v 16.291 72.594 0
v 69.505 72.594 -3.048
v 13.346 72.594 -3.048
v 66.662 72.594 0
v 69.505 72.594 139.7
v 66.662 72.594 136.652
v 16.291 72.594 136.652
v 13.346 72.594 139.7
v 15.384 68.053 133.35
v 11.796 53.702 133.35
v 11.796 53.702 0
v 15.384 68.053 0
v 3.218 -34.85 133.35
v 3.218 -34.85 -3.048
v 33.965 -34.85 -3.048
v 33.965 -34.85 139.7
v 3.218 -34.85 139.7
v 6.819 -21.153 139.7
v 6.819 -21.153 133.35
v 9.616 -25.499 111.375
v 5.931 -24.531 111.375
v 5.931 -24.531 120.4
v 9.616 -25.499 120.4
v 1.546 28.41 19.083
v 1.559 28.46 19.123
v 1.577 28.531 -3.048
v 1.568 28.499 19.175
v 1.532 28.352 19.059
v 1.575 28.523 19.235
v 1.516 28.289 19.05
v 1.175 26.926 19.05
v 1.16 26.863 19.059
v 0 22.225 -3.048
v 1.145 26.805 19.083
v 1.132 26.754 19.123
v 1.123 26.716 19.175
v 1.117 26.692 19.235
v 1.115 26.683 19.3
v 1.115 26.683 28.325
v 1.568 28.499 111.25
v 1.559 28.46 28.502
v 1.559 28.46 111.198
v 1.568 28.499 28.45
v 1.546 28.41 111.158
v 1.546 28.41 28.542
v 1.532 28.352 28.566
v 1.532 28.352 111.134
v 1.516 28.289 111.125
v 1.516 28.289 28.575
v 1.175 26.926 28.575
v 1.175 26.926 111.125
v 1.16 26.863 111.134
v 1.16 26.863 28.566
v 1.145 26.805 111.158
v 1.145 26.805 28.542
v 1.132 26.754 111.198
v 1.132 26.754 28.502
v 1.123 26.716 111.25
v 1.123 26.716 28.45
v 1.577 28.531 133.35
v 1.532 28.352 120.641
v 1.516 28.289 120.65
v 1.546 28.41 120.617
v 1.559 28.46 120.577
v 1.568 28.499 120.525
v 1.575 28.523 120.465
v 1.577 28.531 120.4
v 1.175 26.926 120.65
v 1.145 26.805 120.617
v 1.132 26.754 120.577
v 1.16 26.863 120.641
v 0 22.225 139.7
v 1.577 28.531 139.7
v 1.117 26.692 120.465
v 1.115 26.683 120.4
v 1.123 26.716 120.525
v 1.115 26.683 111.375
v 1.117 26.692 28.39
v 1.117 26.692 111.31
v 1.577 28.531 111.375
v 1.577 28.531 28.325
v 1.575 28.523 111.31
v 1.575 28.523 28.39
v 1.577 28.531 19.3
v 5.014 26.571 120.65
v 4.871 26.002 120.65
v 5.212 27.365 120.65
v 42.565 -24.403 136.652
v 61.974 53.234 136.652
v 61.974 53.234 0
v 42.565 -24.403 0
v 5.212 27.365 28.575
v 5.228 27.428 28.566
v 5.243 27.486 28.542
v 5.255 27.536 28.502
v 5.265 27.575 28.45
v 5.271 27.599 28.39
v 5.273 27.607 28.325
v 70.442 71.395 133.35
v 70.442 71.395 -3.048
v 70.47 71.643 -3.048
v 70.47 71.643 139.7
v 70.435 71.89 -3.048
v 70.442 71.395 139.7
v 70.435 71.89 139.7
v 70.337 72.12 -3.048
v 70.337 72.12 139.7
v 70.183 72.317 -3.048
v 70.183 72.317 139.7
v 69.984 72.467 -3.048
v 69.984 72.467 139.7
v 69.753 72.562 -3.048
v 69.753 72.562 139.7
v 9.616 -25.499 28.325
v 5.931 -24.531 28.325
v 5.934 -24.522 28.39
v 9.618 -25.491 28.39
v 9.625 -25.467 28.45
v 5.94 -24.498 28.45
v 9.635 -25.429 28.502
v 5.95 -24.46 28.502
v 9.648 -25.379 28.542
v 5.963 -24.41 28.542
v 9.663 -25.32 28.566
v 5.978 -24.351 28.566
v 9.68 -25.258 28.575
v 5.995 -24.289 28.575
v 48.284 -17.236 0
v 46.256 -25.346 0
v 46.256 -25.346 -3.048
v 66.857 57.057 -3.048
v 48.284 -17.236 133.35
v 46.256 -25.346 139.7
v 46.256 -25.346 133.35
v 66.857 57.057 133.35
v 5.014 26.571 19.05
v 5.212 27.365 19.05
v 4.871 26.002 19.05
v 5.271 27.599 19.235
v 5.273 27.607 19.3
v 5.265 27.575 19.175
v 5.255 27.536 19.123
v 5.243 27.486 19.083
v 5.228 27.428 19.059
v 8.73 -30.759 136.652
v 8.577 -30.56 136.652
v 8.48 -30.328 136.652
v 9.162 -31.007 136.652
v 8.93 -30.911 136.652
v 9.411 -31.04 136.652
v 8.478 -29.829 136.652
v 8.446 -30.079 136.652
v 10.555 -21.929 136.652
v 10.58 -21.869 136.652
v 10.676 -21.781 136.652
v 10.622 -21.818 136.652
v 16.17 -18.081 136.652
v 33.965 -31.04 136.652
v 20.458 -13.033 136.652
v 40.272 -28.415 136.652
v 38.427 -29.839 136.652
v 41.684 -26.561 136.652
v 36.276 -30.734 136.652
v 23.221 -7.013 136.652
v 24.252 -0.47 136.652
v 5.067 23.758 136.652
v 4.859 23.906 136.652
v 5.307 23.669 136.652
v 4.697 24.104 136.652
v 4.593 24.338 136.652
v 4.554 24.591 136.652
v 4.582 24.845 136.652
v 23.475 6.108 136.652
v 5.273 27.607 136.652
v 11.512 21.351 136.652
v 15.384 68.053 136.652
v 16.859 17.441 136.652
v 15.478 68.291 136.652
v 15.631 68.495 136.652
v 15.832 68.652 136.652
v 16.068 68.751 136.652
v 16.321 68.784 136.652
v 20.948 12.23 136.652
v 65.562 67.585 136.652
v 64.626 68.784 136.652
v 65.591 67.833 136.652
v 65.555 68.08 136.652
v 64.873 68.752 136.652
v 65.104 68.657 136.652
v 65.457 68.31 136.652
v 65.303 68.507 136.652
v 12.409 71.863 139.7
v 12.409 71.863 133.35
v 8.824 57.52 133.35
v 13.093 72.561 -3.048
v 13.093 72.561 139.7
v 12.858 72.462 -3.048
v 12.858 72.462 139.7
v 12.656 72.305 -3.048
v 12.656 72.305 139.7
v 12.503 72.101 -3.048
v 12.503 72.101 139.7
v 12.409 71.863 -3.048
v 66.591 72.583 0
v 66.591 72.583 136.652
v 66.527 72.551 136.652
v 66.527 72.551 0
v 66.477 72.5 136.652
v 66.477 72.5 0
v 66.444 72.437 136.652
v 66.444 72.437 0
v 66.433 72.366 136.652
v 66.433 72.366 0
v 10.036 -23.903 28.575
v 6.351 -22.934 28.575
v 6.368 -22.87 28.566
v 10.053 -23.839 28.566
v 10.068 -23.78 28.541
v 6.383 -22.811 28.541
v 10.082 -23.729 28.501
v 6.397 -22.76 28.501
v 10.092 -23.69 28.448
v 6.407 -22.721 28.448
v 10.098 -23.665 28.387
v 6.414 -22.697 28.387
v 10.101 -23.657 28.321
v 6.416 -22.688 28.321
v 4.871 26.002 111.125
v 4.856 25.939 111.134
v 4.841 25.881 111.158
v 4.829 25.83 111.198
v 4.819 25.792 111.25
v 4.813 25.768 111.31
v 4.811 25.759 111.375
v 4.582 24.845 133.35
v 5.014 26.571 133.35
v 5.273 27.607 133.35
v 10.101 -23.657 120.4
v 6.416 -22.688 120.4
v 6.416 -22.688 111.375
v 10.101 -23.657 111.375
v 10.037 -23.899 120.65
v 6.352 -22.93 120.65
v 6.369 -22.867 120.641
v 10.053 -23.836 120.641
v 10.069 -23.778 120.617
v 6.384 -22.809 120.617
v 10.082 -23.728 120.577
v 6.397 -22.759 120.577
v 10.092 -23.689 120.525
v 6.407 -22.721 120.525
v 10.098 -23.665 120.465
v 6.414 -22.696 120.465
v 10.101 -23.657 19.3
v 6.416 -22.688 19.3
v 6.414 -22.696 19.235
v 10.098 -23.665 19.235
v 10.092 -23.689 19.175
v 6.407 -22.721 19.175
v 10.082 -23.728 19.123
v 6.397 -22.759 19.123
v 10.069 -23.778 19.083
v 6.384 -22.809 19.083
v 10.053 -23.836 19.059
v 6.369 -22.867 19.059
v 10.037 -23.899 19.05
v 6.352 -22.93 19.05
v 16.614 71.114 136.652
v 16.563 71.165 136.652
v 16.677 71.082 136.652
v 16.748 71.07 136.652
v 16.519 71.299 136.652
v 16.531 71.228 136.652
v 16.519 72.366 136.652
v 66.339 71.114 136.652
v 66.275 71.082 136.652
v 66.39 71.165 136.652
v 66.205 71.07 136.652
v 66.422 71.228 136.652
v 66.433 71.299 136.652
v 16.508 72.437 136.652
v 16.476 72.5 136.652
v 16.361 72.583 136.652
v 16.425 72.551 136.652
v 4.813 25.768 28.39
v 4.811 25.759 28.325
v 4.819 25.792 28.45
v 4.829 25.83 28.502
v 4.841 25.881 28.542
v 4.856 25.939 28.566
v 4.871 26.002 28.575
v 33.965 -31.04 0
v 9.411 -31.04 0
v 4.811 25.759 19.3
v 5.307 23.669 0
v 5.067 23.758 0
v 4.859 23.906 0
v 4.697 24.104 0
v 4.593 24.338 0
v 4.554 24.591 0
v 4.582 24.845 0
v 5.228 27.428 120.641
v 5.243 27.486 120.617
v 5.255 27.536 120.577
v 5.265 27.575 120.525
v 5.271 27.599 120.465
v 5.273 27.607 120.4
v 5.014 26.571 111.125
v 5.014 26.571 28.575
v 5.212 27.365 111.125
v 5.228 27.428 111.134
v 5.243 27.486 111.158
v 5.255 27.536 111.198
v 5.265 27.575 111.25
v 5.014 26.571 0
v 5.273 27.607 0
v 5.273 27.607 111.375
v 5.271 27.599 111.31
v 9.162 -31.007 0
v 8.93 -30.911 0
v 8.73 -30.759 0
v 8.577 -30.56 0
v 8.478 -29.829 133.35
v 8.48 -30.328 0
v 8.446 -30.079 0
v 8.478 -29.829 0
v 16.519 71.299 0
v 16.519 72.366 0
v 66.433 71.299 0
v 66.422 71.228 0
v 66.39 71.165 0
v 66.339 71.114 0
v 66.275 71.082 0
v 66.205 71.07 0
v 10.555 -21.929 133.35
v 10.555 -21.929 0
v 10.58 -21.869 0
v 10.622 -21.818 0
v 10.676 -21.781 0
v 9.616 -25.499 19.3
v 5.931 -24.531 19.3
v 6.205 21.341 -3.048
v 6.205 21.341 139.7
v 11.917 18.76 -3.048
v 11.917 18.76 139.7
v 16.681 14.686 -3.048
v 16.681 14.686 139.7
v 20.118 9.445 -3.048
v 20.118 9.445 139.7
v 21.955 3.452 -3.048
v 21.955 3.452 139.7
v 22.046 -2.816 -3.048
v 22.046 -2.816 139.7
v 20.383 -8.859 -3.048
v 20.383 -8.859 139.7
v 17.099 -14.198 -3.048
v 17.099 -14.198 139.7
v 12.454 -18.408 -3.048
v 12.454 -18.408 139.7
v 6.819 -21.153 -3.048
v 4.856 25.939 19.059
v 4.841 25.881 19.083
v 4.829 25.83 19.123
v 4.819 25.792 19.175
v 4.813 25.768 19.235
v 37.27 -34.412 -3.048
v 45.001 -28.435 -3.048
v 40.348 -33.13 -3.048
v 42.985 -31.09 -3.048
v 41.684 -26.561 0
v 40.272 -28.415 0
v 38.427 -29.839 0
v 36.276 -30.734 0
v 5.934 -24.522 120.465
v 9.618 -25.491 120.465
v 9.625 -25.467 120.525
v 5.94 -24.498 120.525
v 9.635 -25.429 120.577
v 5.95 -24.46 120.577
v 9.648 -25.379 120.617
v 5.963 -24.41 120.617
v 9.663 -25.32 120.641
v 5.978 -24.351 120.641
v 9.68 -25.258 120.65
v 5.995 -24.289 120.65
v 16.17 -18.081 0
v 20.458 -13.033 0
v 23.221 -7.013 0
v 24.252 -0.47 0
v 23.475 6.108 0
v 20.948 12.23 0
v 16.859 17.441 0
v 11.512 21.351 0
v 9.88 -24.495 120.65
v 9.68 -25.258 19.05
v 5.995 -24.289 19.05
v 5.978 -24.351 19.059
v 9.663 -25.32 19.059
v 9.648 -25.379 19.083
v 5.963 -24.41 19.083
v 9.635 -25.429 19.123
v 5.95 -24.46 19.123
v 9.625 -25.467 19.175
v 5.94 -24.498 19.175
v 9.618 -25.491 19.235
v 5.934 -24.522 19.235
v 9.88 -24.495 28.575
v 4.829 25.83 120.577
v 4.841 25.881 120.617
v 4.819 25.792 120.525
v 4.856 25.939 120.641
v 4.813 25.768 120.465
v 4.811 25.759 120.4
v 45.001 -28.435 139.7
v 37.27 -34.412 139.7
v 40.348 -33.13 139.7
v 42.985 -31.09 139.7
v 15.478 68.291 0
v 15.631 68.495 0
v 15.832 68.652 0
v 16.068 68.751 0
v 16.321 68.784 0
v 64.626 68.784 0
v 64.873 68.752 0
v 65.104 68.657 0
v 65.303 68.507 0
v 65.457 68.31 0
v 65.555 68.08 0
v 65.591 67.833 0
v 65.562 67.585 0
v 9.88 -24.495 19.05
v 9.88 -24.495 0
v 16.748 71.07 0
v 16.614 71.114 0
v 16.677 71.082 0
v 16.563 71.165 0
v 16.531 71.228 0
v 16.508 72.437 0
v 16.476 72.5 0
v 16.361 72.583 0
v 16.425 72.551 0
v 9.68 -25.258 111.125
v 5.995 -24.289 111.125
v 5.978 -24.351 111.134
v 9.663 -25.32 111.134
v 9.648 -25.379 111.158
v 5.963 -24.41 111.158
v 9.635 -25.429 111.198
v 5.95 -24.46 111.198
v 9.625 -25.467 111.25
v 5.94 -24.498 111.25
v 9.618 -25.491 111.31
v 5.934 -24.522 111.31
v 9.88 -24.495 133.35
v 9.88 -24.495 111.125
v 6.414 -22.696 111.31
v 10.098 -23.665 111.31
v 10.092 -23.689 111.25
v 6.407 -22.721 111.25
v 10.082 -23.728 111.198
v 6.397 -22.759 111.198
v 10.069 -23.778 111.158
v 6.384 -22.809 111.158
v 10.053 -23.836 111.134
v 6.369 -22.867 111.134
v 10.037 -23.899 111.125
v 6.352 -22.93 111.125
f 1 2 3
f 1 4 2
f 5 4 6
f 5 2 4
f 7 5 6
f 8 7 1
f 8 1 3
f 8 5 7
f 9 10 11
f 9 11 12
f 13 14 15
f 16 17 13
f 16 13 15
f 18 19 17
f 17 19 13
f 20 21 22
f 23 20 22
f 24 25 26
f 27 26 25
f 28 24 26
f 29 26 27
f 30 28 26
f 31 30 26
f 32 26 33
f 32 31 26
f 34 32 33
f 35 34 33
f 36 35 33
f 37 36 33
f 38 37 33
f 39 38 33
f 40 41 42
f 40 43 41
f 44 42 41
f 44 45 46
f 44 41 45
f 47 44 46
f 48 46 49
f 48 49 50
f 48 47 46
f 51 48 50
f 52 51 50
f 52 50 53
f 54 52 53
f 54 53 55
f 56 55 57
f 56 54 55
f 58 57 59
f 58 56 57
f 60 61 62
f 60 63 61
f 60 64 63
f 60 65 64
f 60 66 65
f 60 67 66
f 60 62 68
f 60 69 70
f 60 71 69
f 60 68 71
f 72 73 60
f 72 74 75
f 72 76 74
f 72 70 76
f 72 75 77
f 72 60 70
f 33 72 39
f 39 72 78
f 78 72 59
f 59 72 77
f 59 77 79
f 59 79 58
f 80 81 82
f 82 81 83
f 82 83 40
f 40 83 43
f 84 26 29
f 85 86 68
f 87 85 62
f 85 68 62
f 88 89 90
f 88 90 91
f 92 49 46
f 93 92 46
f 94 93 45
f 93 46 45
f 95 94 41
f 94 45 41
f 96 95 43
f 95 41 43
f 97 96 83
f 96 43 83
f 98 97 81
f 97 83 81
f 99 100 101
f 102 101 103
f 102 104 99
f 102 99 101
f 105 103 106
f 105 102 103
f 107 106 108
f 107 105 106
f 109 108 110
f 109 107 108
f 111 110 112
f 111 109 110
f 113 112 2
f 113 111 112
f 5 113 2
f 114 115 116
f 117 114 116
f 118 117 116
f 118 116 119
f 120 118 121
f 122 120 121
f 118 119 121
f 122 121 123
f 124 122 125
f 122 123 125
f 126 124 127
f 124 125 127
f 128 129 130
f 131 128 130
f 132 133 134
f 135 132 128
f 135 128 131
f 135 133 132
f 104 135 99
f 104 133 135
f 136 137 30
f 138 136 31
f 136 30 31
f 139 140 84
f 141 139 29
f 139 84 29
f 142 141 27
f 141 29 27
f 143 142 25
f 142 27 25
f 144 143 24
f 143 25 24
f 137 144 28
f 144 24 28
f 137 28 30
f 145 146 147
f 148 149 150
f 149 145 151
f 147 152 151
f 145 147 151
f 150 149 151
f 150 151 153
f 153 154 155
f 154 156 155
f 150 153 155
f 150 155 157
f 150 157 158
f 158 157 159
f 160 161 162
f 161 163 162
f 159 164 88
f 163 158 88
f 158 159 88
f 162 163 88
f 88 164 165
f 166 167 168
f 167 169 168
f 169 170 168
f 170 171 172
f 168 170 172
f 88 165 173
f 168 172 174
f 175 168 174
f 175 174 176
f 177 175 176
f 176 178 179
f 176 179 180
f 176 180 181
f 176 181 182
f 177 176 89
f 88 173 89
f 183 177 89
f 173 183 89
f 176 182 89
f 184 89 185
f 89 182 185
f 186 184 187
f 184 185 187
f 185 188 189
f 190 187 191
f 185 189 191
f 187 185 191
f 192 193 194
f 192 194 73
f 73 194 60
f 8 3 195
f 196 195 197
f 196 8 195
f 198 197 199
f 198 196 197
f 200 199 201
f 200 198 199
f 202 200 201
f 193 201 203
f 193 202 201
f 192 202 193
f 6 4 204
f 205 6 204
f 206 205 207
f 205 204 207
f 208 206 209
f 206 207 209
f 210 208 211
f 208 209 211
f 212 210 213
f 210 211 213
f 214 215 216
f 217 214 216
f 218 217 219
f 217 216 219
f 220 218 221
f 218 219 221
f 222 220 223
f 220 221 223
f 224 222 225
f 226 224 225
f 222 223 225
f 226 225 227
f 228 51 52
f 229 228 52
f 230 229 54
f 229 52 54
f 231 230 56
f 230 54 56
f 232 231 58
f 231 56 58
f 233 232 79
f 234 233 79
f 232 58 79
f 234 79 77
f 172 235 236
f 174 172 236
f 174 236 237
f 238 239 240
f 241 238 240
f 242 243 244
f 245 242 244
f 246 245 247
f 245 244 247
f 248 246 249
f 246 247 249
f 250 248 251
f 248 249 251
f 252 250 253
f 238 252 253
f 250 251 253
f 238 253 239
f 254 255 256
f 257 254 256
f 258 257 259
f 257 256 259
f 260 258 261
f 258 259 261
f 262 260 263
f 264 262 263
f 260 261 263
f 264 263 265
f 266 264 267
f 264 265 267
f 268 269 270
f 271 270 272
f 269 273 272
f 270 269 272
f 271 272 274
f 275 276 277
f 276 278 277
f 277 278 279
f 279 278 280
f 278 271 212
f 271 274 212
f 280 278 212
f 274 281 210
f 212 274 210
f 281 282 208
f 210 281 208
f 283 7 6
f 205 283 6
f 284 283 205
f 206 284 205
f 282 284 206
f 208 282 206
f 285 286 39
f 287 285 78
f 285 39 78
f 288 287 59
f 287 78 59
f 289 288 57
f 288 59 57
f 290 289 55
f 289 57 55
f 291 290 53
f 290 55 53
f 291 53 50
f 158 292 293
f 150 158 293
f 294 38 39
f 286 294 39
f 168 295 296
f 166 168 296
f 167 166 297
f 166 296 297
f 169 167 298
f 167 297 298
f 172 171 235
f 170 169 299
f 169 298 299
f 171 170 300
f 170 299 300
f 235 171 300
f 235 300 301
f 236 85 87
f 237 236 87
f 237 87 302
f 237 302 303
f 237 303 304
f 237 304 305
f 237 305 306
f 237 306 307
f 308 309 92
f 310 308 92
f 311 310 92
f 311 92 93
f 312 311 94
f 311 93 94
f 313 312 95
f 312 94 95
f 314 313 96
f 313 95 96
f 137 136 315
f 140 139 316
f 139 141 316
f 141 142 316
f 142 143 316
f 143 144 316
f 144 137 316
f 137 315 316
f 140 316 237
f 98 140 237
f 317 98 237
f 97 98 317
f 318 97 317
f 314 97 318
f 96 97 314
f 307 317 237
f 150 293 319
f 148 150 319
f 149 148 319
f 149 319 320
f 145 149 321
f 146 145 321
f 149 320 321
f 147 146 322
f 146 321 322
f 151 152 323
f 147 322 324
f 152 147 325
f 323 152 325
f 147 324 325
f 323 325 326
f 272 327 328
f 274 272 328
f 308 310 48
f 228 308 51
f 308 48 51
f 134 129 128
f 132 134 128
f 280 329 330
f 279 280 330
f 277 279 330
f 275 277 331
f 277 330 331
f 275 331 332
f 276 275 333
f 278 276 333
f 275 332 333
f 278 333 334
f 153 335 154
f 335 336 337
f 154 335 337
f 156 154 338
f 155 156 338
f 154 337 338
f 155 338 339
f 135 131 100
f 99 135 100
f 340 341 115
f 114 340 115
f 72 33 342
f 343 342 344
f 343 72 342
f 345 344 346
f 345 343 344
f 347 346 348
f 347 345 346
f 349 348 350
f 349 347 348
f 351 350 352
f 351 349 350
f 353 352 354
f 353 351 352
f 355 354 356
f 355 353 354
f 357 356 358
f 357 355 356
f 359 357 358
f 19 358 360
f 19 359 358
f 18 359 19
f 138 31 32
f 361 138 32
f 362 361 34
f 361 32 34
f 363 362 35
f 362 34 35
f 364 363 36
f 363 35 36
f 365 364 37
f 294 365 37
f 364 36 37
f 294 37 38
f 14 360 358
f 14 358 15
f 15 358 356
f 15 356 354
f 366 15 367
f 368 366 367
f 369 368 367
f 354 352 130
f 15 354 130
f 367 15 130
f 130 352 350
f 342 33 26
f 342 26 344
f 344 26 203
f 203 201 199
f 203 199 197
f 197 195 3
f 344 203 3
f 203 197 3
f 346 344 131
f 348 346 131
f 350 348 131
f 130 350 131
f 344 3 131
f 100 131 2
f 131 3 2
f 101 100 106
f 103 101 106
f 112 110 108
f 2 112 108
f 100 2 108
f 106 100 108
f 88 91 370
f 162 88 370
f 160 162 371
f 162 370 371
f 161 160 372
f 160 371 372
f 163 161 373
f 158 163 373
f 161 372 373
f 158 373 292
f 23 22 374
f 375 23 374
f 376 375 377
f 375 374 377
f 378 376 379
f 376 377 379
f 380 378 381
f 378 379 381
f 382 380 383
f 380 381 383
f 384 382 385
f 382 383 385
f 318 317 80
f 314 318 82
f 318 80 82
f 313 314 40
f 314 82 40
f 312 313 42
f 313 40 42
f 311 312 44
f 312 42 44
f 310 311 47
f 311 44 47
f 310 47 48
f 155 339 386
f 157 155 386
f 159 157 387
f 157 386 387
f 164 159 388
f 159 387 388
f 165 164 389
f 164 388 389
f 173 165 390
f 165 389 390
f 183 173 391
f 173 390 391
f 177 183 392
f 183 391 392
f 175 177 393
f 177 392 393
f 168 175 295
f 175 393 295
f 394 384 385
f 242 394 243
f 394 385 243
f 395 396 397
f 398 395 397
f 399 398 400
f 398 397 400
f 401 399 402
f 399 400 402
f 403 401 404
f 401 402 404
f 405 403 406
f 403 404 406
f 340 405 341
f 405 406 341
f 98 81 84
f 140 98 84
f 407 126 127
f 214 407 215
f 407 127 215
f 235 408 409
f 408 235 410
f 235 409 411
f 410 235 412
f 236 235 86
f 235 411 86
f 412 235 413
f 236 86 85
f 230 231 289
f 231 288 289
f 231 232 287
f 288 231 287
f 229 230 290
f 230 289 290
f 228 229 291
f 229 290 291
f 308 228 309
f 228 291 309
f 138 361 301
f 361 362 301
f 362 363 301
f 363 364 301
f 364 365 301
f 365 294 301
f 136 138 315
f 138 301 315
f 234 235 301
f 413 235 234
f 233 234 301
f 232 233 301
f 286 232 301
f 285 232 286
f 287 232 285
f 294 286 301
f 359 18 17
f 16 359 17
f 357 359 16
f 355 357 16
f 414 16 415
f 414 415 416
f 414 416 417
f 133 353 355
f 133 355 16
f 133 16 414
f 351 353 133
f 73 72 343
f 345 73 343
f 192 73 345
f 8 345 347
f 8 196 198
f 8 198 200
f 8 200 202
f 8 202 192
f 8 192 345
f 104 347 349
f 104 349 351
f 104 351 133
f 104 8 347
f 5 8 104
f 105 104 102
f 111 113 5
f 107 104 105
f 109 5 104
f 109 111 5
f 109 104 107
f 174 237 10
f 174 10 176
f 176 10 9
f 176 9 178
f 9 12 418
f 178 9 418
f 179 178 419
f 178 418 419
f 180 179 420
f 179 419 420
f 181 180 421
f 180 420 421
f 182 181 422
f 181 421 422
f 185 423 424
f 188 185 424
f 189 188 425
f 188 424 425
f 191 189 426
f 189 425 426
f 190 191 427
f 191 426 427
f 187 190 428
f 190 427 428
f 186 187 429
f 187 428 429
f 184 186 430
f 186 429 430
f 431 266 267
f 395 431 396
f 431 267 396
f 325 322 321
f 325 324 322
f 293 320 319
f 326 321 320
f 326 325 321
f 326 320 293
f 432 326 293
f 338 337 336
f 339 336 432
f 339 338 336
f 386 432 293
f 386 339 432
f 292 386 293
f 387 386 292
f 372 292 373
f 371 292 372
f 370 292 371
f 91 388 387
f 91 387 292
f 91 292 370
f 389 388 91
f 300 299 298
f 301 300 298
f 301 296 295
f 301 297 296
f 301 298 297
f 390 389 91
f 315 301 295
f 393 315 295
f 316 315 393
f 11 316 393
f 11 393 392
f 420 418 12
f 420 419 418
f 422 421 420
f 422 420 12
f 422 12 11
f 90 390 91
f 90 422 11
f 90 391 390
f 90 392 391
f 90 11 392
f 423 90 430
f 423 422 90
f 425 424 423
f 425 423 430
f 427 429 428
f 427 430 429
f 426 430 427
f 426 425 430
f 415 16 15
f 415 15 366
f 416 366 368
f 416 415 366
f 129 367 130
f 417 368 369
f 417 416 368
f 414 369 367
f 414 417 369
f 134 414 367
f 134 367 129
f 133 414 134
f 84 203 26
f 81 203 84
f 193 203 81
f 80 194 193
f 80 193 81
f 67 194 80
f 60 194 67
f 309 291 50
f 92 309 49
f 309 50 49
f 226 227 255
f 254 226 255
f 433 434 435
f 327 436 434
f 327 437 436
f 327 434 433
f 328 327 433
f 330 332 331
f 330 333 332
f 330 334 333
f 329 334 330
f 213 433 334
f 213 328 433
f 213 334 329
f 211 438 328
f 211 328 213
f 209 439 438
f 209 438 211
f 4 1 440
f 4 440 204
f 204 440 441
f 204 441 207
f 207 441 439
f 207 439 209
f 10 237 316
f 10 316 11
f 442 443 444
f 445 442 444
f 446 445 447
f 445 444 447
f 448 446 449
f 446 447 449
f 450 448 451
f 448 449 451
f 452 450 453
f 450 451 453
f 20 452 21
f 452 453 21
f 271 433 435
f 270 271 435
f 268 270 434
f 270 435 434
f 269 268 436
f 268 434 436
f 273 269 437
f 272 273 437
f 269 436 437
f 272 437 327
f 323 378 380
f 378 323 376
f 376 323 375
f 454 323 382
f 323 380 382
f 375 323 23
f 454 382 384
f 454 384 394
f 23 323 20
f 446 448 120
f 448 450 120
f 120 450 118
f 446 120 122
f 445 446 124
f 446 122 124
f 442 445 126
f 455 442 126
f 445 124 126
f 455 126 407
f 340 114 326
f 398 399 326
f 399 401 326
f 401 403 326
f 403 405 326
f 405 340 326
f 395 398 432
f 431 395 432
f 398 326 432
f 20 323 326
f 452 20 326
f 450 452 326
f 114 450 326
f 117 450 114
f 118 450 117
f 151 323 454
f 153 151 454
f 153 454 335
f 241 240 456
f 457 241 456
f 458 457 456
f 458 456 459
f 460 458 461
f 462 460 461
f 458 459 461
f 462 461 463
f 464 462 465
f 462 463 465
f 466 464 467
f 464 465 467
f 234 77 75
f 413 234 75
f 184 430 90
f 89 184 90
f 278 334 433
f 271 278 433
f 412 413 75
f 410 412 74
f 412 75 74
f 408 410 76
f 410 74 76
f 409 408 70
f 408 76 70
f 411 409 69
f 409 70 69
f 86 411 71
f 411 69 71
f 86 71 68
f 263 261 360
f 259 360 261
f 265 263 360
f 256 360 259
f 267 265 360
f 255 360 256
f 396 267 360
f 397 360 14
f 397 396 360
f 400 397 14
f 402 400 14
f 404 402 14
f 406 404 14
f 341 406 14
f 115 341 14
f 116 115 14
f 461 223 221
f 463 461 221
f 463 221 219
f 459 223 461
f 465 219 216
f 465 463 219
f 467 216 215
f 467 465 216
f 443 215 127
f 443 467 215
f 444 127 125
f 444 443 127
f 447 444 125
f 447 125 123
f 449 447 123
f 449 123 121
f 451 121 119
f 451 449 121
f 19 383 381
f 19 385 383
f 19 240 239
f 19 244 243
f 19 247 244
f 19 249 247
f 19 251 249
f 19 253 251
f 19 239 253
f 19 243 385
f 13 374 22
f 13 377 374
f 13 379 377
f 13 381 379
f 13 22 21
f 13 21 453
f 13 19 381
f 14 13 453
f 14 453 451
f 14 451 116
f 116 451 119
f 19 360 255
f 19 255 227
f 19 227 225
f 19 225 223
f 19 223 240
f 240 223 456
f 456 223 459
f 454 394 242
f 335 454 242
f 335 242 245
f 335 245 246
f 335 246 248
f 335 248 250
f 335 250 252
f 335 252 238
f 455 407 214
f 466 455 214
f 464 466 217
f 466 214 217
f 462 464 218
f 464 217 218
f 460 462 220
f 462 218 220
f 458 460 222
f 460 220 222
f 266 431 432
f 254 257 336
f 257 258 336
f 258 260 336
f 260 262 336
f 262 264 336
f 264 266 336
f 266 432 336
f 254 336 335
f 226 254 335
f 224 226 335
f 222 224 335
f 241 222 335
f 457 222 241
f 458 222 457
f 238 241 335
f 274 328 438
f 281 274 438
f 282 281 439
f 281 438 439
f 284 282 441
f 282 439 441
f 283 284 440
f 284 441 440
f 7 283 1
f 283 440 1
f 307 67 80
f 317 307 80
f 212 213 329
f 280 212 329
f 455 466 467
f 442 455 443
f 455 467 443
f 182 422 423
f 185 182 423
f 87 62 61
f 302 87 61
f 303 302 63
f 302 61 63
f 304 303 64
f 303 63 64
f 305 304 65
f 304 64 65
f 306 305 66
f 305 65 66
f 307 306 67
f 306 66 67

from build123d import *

# Parameters (mm, degrees)
F1_DEPTH  = 6.35
F2_DEPTH  = 133.35
F4_DEPTH  = 12.7
F6_DEPTH  = 12.7
F9_DEPTH  = 3.048
F10_DEPTH = 3.048


with BuildPart() as f1:
    # F0 (on Top) → F1 (new body)
    with BuildSketch(Plane.XY):
        with BuildLine():
            ThreePointArc((0, 22.225), (21.9553420771, 3.451605319), (6.8194533628, -21.152911876))
            Line((6.8194533628, -21.152911876), (3.2182324681, -34.8499524029))
            Line((3.2182324681, -34.8499524029), (16.4174194703, -34.8499524029))
            Line((16.4174194703, -34.8499524029), (33.9651857852, -34.8499524029))
            ThreePointArc((33.9651857852, -34.8499524029), (41.7335775109, -32.1969464806), (46.2563646294, -25.3463445283))
            Line((46.2563646294, -25.3463445283), (48.2839106629, -17.2361603944))
            Line((48.2839106629, -17.2361603944), (66.8572394912, 57.057154919))
            Line((66.8572394912, 57.057154919), (70.441746016, 71.3951810179))
            ThreePointArc((70.441746016, 71.3951810179), (70.2661403636, 72.2232722677), (69.5053644748, 72.5944764032))
            Line((69.5053644748, 72.5944764032), (66.6618312249, 72.5944764032))
            ThreePointArc((66.6618312249, 72.5944764032), (66.5001866147, 72.5275210134), (66.4332312249, 72.3658764032))
            Line((66.4332312249, 72.3658764032), (66.4332312249, 71.2990764032))
            ThreePointArc((66.4332312249, 71.2990764032), (66.3662758351, 71.137431793), (66.2046312249, 71.0704764032))
            Line((66.2046312249, 71.0704764032), (62.9969858988, 71.0704764032))
            Line((62.9969858988, 71.0704764032), (16.7480240974, 71.0704764032))
            ThreePointArc((16.7480240974, 71.0704764032), (16.5863794872, 71.137431793), (16.5194240974, 71.2990764032))
            Line((16.5194240974, 71.2990764032), (16.5194240974, 72.3658764032))
            ThreePointArc((16.5194240974, 72.3658764032), (16.4524687076, 72.5275210134), (16.2908240974, 72.5944764032))
            Line((16.2908240974, 72.5944764032), (13.3457788493, 72.5944764032))
            ThreePointArc((13.3457788493, 72.5944764032), (12.7517813684, 72.3900510299), (12.4093963134, 71.8633678095))
            Line((12.4093963134, 71.8633678095), (8.8236883425, 57.5202768957))
            Line((8.8236883425, 57.5202768957), (1.5766180268, 28.5314721071))
            Line((1.5766180268, 28.5314721071), (0, 22.225))
        make_face()
        with BuildLine():
            Line((8.4777404731, -29.8293234814), (9.8803254969, -24.4946704637))
            Line((9.8803254969, -24.4946704637), (10.5548516962, -21.9291481147))
            ThreePointArc((10.5548516962, -21.9291481147), (10.5992515812, -21.8420847409), (10.675842156, -21.78137836))
            ThreePointArc((10.675842156, -21.78137836), (24.0895462893, 2.8453134411), (5.3074870946, 23.6692338224))
            ThreePointArc((5.3074870946, 23.6692338224), (4.6971406745, 24.104398176), (4.5822935216, 24.845141653))
            Line((4.5822935216, 24.845141653), (5.0136417236, 26.570534461))
            Line((5.0136417236, 26.570534461), (5.2728629157, 27.6074192291))
            Line((5.2728629157, 27.6074192291), (11.7964822448, 53.7023678095))
            Line((11.7964822448, 53.7023678095), (15.3841674516, 68.0533678095))
            ThreePointArc((15.3841674516, 68.0533678095), (15.7265525066, 68.5800510299), (16.3205499875, 68.7844764032))
            Line((16.3205499875, 68.7844764032), (62.9969858988, 68.7844764032))
            Line((62.9969858988, 68.7844764032), (64.6255415732, 68.7844764032))
            ThreePointArc((64.6255415732, 68.7844764032), (65.3863161999, 68.4132738841), (65.5619241091, 67.5851849969))
            Line((65.5619241091, 67.5851849969), (61.9742379076, 53.2341810179))
            Line((61.9742379076, 53.2341810179), (44.5876677374, -16.312099663))
            Line((44.5876677374, -16.312099663), (42.5648720315, -24.4032824866))
            ThreePointArc((42.5648720315, -24.4032824866), (39.3965758263, -29.1878570785), (33.9651857852, -31.0399524029))
            Line((33.9651857852, -31.0399524029), (16.7253963249, -31.0399524029))
            Line((16.7253963249, -31.0399524029), (9.4112155314, -31.0399524029))
            ThreePointArc((9.4112155314, -31.0399524029), (8.6468533675, -30.6641262423), (8.4777404731, -29.8293234814))
        make_face(mode=Mode.SUBTRACT)
    extrude(amount=F1_DEPTH)

    # F0 (on Top) + F1_face (on face) → F2 (join)
    with BuildSketch(Plane.XY):
        with BuildLine():
            ThreePointArc((0, 22.225), (21.9553420771, 3.451605319), (6.8194533628, -21.152911876))
            Line((6.8194533628, -21.152911876), (3.2182324681, -34.8499524029))
            Line((3.2182324681, -34.8499524029), (16.4174194703, -34.8499524029))
            Line((16.4174194703, -34.8499524029), (33.9651857852, -34.8499524029))
            ThreePointArc((33.9651857852, -34.8499524029), (41.7335775109, -32.1969464806), (46.2563646294, -25.3463445283))
            Line((46.2563646294, -25.3463445283), (48.2839106629, -17.2361603944))
            Line((48.2839106629, -17.2361603944), (66.8572394912, 57.057154919))
            Line((66.8572394912, 57.057154919), (70.441746016, 71.3951810179))
            ThreePointArc((70.441746016, 71.3951810179), (70.2661403636, 72.2232722677), (69.5053644748, 72.5944764032))
            Line((69.5053644748, 72.5944764032), (66.6618312249, 72.5944764032))
            ThreePointArc((66.6618312249, 72.5944764032), (66.5001866147, 72.5275210134), (66.4332312249, 72.3658764032))
            Line((66.4332312249, 72.3658764032), (66.4332312249, 71.2990764032))
            ThreePointArc((66.4332312249, 71.2990764032), (66.3662758351, 71.137431793), (66.2046312249, 71.0704764032))
            Line((66.2046312249, 71.0704764032), (62.9969858988, 71.0704764032))
            Line((62.9969858988, 71.0704764032), (16.7480240974, 71.0704764032))
            ThreePointArc((16.7480240974, 71.0704764032), (16.5863794872, 71.137431793), (16.5194240974, 71.2990764032))
            Line((16.5194240974, 71.2990764032), (16.5194240974, 72.3658764032))
            ThreePointArc((16.5194240974, 72.3658764032), (16.4524687076, 72.5275210134), (16.2908240974, 72.5944764032))
            Line((16.2908240974, 72.5944764032), (13.3457788493, 72.5944764032))
            ThreePointArc((13.3457788493, 72.5944764032), (12.7517813684, 72.3900510299), (12.4093963134, 71.8633678095))
            Line((12.4093963134, 71.8633678095), (8.8236883425, 57.5202768957))
            Line((8.8236883425, 57.5202768957), (1.5766180268, 28.5314721071))
            Line((1.5766180268, 28.5314721071), (0, 22.225))
        make_face()
        with BuildLine():
            Line((8.4777404731, -29.8293234814), (9.8803254969, -24.4946704637))
            Line((9.8803254969, -24.4946704637), (10.5548516962, -21.9291481147))
            ThreePointArc((10.5548516962, -21.9291481147), (10.5992515812, -21.8420847409), (10.675842156, -21.78137836))
            ThreePointArc((10.675842156, -21.78137836), (24.0895462893, 2.8453134411), (5.3074870946, 23.6692338224))
            ThreePointArc((5.3074870946, 23.6692338224), (4.6971406745, 24.104398176), (4.5822935216, 24.845141653))
            Line((4.5822935216, 24.845141653), (5.0136417236, 26.570534461))
            Line((5.0136417236, 26.570534461), (5.2728629157, 27.6074192291))
            Line((5.2728629157, 27.6074192291), (11.7964822448, 53.7023678095))
            Line((11.7964822448, 53.7023678095), (15.3841674516, 68.0533678095))
            ThreePointArc((15.3841674516, 68.0533678095), (15.7265525066, 68.5800510299), (16.3205499875, 68.7844764032))
            Line((16.3205499875, 68.7844764032), (62.9969858988, 68.7844764032))
            Line((62.9969858988, 68.7844764032), (64.6255415732, 68.7844764032))
            ThreePointArc((64.6255415732, 68.7844764032), (65.3863161999, 68.4132738841), (65.5619241091, 67.5851849969))
            Line((65.5619241091, 67.5851849969), (61.9742379076, 53.2341810179))
            Line((61.9742379076, 53.2341810179), (44.5876677374, -16.312099663))
            Line((44.5876677374, -16.312099663), (42.5648720315, -24.4032824866))
            ThreePointArc((42.5648720315, -24.4032824866), (39.3965758263, -29.1878570785), (33.9651857852, -31.0399524029))
            Line((33.9651857852, -31.0399524029), (16.7253963249, -31.0399524029))
            Line((16.7253963249, -31.0399524029), (9.4112155314, -31.0399524029))
            ThreePointArc((9.4112155314, -31.0399524029), (8.6468533675, -30.6641262423), (8.4777404731, -29.8293234814))
        make_face(mode=Mode.SUBTRACT)
    with BuildSketch(Plane(origin=(33.8847935275, 19.8846997175, 6.35), x_dir=(1, 0, 0), z_dir=(0, 0, 1))):
        with BuildLine():
            Line((-32.3081755007, 8.6467723896), (-33.8847935275, 2.3403002825))
            ThreePointArc((-33.8847935275, 2.3403002825), (-11.9294514504, -16.4330943985), (-27.0653401647, -41.0376115934))
            Line((-27.0653401647, -41.0376115934), (-30.6665610594, -54.7346521204))
            Line((-30.6665610594, -54.7346521204), (0.0803922577, -54.7346521204))
            ThreePointArc((0.0803922577, -54.7346521204), (7.8487839834, -52.081646198), (12.3715711019, -45.2310442458))
            Line((12.3715711019, -45.2310442458), (36.5569524885, 51.5104813004))
            ThreePointArc((36.5569524885, 51.5104813004), (36.3813468361, 52.3385725502), (35.6205709473, 52.7097766857))
            Line((35.6205709473, 52.7097766857), (32.7770376974, 52.7097766857))
            ThreePointArc((32.7770376974, 52.7097766857), (32.6153930872, 52.6428212959), (32.5484376974, 52.4811766857))
            Line((32.5484376974, 52.4811766857), (32.5484376974, 51.4143766857))
            ThreePointArc((32.5484376974, 51.4143766857), (32.4814823076, 51.2527320756), (32.3198376974, 51.1857766857))
            Line((32.3198376974, 51.1857766857), (-17.1367694301, 51.1857766857))
            ThreePointArc((-17.1367694301, 51.1857766857), (-17.2984140403, 51.2527320756), (-17.3653694301, 51.4143766857))
            Line((-17.3653694301, 51.4143766857), (-17.3653694301, 52.4811766857))
            ThreePointArc((-17.3653694301, 52.4811766857), (-17.4323248199, 52.6428212959), (-17.5939694301, 52.7097766857))
            Line((-17.5939694301, 52.7097766857), (-20.5390146782, 52.7097766857))
            ThreePointArc((-20.5390146782, 52.7097766857), (-21.1330121591, 52.5053513125), (-21.475397214, 51.978668092))
            Line((-21.475397214, 51.978668092), (-32.3081755007, 8.6467723896))
        make_face()
        with BuildLine():
            Line((28.0894443801, 33.3494813004), (8.680078504, -44.287982204))
            ThreePointArc((8.680078504, -44.287982204), (5.5117822988, -49.0725567959), (0.0803922577, -50.9246521204))
            Line((0.0803922577, -50.9246521204), (-24.4735779961, -50.9246521204))
            ThreePointArc((-24.4735779961, -50.9246521204), (-25.2379401599, -50.5488259597), (-25.4070530544, -49.7140231989))
            Line((-25.4070530544, -49.7140231989), (-23.3299418313, -41.8138478322))
            ThreePointArc((-23.3299418313, -41.8138478322), (-23.2855419463, -41.7267844584), (-23.2089513715, -41.6660780774))
            ThreePointArc((-23.2089513715, -41.6660780774), (-9.7952472382, -17.0393862764), (-28.5773064329, 3.7845341049))
            ThreePointArc((-28.5773064329, 3.7845341049), (-29.187652853, 4.2196984585), (-29.3025000058, 4.9604419355))
            Line((-29.3025000058, 4.9604419355), (-28.6119306118, 7.7227195116))
            Line((-28.6119306118, 7.7227195116), (-18.5006260759, 48.168668092))
            ThreePointArc((-18.5006260759, 48.168668092), (-18.1582410209, 48.6953513125), (-17.56424354, 48.8997766857))
            Line((-17.56424354, 48.8997766857), (30.7407480457, 48.8997766857))
            ThreePointArc((30.7407480457, 48.8997766857), (31.5015226724, 48.5285741666), (31.6771305816, 47.7004852794))
            Line((31.6771305816, 47.7004852794), (28.0894443801, 33.3494813004))
        make_face(mode=Mode.SUBTRACT)
    extrude(amount=F2_DEPTH)

    # F3 (on face) → F4 (cut)
    with BuildSketch(Plane(origin=(11.580450504, -3.0447278186, 0), x_dir=(-0.2542777886, -0.9671312249, 0), z_dir=(-0.9671312249, 0.2542777886, 0))):
        with BuildLine():
            ThreePointArc((20.3111060532, 19.2999036496), (20.3843011375, 19.1231950843), (20.5610097027, 19.05))
            Line((20.5610097027, 19.05), (21.9662024036, 19.05))
            ThreePointArc((21.9662024036, 19.05), (22.1429109688, 19.1231950843), (22.2161060532, 19.2999036496))
            Line((22.2161060532, 19.2999036496), (22.2161060532, 28.3250963504))
            ThreePointArc((22.2161060532, 28.3250963504), (22.1429109688, 28.5018049157), (21.9662024036, 28.575))
            Line((21.9662024036, 28.575), (20.5651060532, 28.575))
            ThreePointArc((20.5651060532, 28.575), (20.3855009307, 28.5006051224), (20.3111060532, 28.321))
            Line((20.3111060532, 28.321), (20.3111060532, 19.2999036496))
        make_face()
        with BuildLine():
            Line((21.9662024036, 120.65), (20.5610097027, 120.65))
            ThreePointArc((20.5610097027, 120.65), (20.3843011375, 120.5768049157), (20.3111060532, 120.4000963504))
            Line((20.3111060532, 120.4000963504), (20.3111060532, 111.3749036496))
            ThreePointArc((20.3111060532, 111.3749036496), (20.3843011375, 111.1981950843), (20.5610097027, 111.125))
            Line((20.5610097027, 111.125), (21.9662024036, 111.125))
            ThreePointArc((21.9662024036, 111.125), (22.1429109688, 111.1981950843), (22.2161060532, 111.3749036496))
            Line((22.2161060532, 111.3749036496), (22.2161060532, 120.4000963504))
            ThreePointArc((22.2161060532, 120.4000963504), (22.1429109688, 120.5768049157), (21.9662024036, 120.65))
        make_face()
    extrude(amount=-F4_DEPTH, mode=Mode.SUBTRACT)

    # F5 (on face) → F6 (cut)
    with BuildSketch(Plane(origin=(-5.2294117647, 1.3073529412, 0), x_dir=(-0.242535625, -0.9701425001, 0), z_dir=(-0.9701425001, 0.242535625, 0))):
        with BuildLine():
            Line((-26.1569797214, 111.3749036496), (-26.1569797214, 120.4000963504))
            ThreePointArc((-26.1569797214, 120.4000963504), (-26.2301748057, 120.5768049157), (-26.4068833709, 120.65))
            Line((-26.4068833709, 120.65), (-27.8120760718, 120.65))
            ThreePointArc((-27.8120760718, 120.65), (-27.988784637, 120.5768049157), (-28.0619797214, 120.4000963504))
            Line((-28.0619797214, 120.4000963504), (-28.0619797214, 111.3749036496))
            ThreePointArc((-28.0619797214, 111.3749036496), (-27.988784637, 111.1981950843), (-27.8120760718, 111.125))
            Line((-27.8120760718, 111.125), (-26.4068833709, 111.125))
            ThreePointArc((-26.4068833709, 111.125), (-26.2301748057, 111.1981950843), (-26.1569797214, 111.3749036496))
        make_face()
        with BuildLine():
            ThreePointArc((-27.8120760718, 28.575), (-27.988784637, 28.5018049157), (-28.0619797214, 28.3250963504))
            Line((-28.0619797214, 28.3250963504), (-28.0619797214, 19.2999036496))
            ThreePointArc((-28.0619797214, 19.2999036496), (-27.988784637, 19.1231950843), (-27.8120760718, 19.05))
            Line((-27.8120760718, 19.05), (-26.4068833709, 19.05))
            ThreePointArc((-26.4068833709, 19.05), (-26.2301748057, 19.1231950843), (-26.1569797214, 19.2999036496))
            Line((-26.1569797214, 19.2999036496), (-26.1569797214, 28.3250963504))
            ThreePointArc((-26.1569797214, 28.3250963504), (-26.2301748057, 28.5018049157), (-26.4068833709, 28.575))
            Line((-26.4068833709, 28.575), (-27.8120760718, 28.575))
        make_face()
    extrude(amount=-F6_DEPTH, mode=Mode.SUBTRACT)

    # F8 (on face) → F9 (join)
    with BuildSketch(Plane.XY.offset(139.7)):
        with BuildLine():
            Line((46.2563646294, -25.3463445283), (66.8572394912, 57.057154919))
            Line((66.8572394912, 57.057154919), (70.441746016, 71.3951810179))
            ThreePointArc((70.441746016, 71.3951810179), (70.2661403636, 72.2232722677), (69.5053644748, 72.5944764032))
            Line((69.5053644748, 72.5944764032), (66.6618312249, 72.5944764032))
            ThreePointArc((66.6618312249, 72.5944764032), (66.5001866147, 72.5275210134), (66.4332312249, 72.3658764032))
            Line((66.4332312249, 72.3658764032), (66.4332312249, 71.2990764032))
            ThreePointArc((66.4332312249, 71.2990764032), (66.3662758351, 71.137431793), (66.2046312249, 71.0704764032))
            Line((66.2046312249, 71.0704764032), (16.7480240974, 71.0704764032))
            ThreePointArc((16.7480240974, 71.0704764032), (16.5863794872, 71.137431793), (16.5194240974, 71.2990764032))
            Line((16.5194240974, 71.2990764032), (16.5194240974, 72.3658764032))
            ThreePointArc((16.5194240974, 72.3658764032), (16.4524687076, 72.5275210134), (16.2908240974, 72.5944764032))
            Line((16.2908240974, 72.5944764032), (13.3457788493, 72.5944764032))
            ThreePointArc((13.3457788493, 72.5944764032), (12.7517813684, 72.3900510299), (12.4093963134, 71.8633678095))
            Line((12.4093963134, 71.8633678095), (8.8236883425, 57.5202768957))
            Line((8.8236883425, 57.5202768957), (1.5766180268, 28.5314721071))
            Line((1.5766180268, 28.5314721071), (0, 22.225))
            ThreePointArc((0, 22.225), (21.9553420771, 3.451605319), (6.8194533628, -21.152911876))
            Line((6.8194533628, -21.152911876), (3.2182324681, -34.8499524029))
            Line((3.2182324681, -34.8499524029), (33.9651857852, -34.8499524029))
            ThreePointArc((33.9651857852, -34.8499524029), (41.7335775109, -32.1969464806), (46.2563646294, -25.3463445283))
        make_face()
        with BuildLine():
            Line((65.5619241091, 67.5851849969), (61.9742379076, 53.2341810179))
            Line((61.9742379076, 53.2341810179), (42.5648720315, -24.4032824866))
            ThreePointArc((42.5648720315, -24.4032824866), (39.3965758263, -29.1878570785), (33.9651857852, -31.0399524029))
            Line((33.9651857852, -31.0399524029), (9.4112155314, -31.0399524029))
            ThreePointArc((9.4112155314, -31.0399524029), (8.6468533675, -30.6641262423), (8.4777404731, -29.8293234814))
            Line((8.4777404731, -29.8293234814), (10.5548516962, -21.9291481147))
            ThreePointArc((10.5548516962, -21.9291481147), (10.5992515812, -21.8420847409), (10.675842156, -21.78137836))
            ThreePointArc((10.675842156, -21.78137836), (24.0895462893, 2.8453134411), (5.3074870946, 23.6692338224))
            ThreePointArc((5.3074870946, 23.6692338224), (4.6971406745, 24.104398176), (4.5822935216, 24.845141653))
            Line((4.5822935216, 24.845141653), (5.2728629157, 27.6074192291))
            Line((5.2728629157, 27.6074192291), (15.3841674516, 68.0533678095))
            ThreePointArc((15.3841674516, 68.0533678095), (15.7265525066, 68.5800510299), (16.3205499875, 68.7844764032))
            Line((16.3205499875, 68.7844764032), (64.6255415732, 68.7844764032))
            ThreePointArc((64.6255415732, 68.7844764032), (65.3863161999, 68.4132738841), (65.5619241091, 67.5851849969))
        make_face(mode=Mode.SUBTRACT)
        with BuildLine():
            Line((46.2563646294, -25.3463445283), (66.8572394912, 57.057154919))
            Line((66.8572394912, 57.057154919), (70.441746016, 71.3951810179))
            ThreePointArc((70.441746016, 71.3951810179), (70.2661403636, 72.2232722677), (69.5053644748, 72.5944764032))
            Line((69.5053644748, 72.5944764032), (66.6618312249, 72.5944764032))
            ThreePointArc((66.6618312249, 72.5944764032), (66.5001866147, 72.5275210134), (66.4332312249, 72.3658764032))
            Line((66.4332312249, 72.3658764032), (66.4332312249, 71.2990764032))
            ThreePointArc((66.4332312249, 71.2990764032), (66.3662758351, 71.137431793), (66.2046312249, 71.0704764032))
            Line((66.2046312249, 71.0704764032), (16.7480240974, 71.0704764032))
            ThreePointArc((16.7480240974, 71.0704764032), (16.5863794872, 71.137431793), (16.5194240974, 71.2990764032))
            Line((16.5194240974, 71.2990764032), (16.5194240974, 72.3658764032))
            ThreePointArc((16.5194240974, 72.3658764032), (16.4524687076, 72.5275210134), (16.2908240974, 72.5944764032))
            Line((16.2908240974, 72.5944764032), (13.3457788493, 72.5944764032))
            ThreePointArc((13.3457788493, 72.5944764032), (12.7517813684, 72.3900510299), (12.4093963134, 71.8633678095))
            Line((12.4093963134, 71.8633678095), (8.8236883425, 57.5202768957))
            Line((8.8236883425, 57.5202768957), (1.5766180268, 28.5314721071))
            Line((1.5766180268, 28.5314721071), (0, 22.225))
            ThreePointArc((0, 22.225), (21.9553420771, 3.451605319), (6.8194533628, -21.152911876))
            Line((6.8194533628, -21.152911876), (3.2182324681, -34.8499524029))
            Line((3.2182324681, -34.8499524029), (33.9651857852, -34.8499524029))
            ThreePointArc((33.9651857852, -34.8499524029), (41.7335775109, -32.1969464806), (46.2563646294, -25.3463445283))
        make_face()
        with BuildLine():
            ThreePointArc((66.4332312249, 72.3658764032), (66.5001866147, 72.5275210134), (66.6618312249, 72.5944764032))
            Line((66.6618312249, 72.5944764032), (16.2908240974, 72.5944764032))
            ThreePointArc((16.2908240974, 72.5944764032), (16.4524687076, 72.5275210134), (16.5194240974, 72.3658764032))
            Line((16.5194240974, 72.3658764032), (16.5194240974, 71.2990764032))
            ThreePointArc((16.5194240974, 71.2990764032), (16.5863794872, 71.137431793), (16.7480240974, 71.0704764032))
            Line((16.7480240974, 71.0704764032), (66.2046312249, 71.0704764032))
            ThreePointArc((66.2046312249, 71.0704764032), (66.3662758351, 71.137431793), (66.4332312249, 71.2990764032))
            Line((66.4332312249, 71.2990764032), (66.4332312249, 72.3658764032))
        make_face()
    extrude(amount=-F9_DEPTH)

    # F7 (on Top) → F10 (join)
    with BuildSketch(Plane.XY):
        with BuildLine():
            Line((6.8194533628, -21.152911876), (3.2182324681, -34.8499524029))
            Line((3.2182324681, -34.8499524029), (33.9651857852, -34.8499524029))
            ThreePointArc((33.9651857852, -34.8499524029), (41.7335775109, -32.1969464806), (46.2563646294, -25.3463445283))
            Line((46.2563646294, -25.3463445283), (66.8572394912, 57.057154919))
            Line((66.8572394912, 57.057154919), (70.441746016, 71.3951810179))
            ThreePointArc((70.441746016, 71.3951810179), (70.2661403636, 72.2232722677), (69.5053644748, 72.5944764032))
            Line((69.5053644748, 72.5944764032), (66.6618312249, 72.5944764032))
            ThreePointArc((66.6618312249, 72.5944764032), (66.5001866147, 72.5275210134), (66.4332312249, 72.3658764032))
            Line((66.4332312249, 72.3658764032), (66.4332312249, 71.2990764032))
            ThreePointArc((66.4332312249, 71.2990764032), (66.3662758351, 71.137431793), (66.2046312249, 71.0704764032))
            Line((66.2046312249, 71.0704764032), (16.7480240974, 71.0704764032))
            ThreePointArc((16.7480240974, 71.0704764032), (16.5863794872, 71.137431793), (16.5194240974, 71.2990764032))
            Line((16.5194240974, 71.2990764032), (16.5194240974, 72.3658764032))
            ThreePointArc((16.5194240974, 72.3658764032), (16.4524687076, 72.5275210134), (16.2908240974, 72.5944764032))
            Line((16.2908240974, 72.5944764032), (13.3457788493, 72.5944764032))
            ThreePointArc((13.3457788493, 72.5944764032), (12.7517813684, 72.3900510299), (12.4093963134, 71.8633678095))
            Line((12.4093963134, 71.8633678095), (1.5766180268, 28.5314721071))
            Line((1.5766180268, 28.5314721071), (0, 22.225))
            ThreePointArc((0, 22.225), (21.9553420771, 3.451605319), (6.8194533628, -21.152911876))
        make_face()
        with BuildLine():
            ThreePointArc((66.4332312249, 72.3658764032), (66.5001866147, 72.5275210134), (66.6618312249, 72.5944764032))
            Line((66.6618312249, 72.5944764032), (16.2908240974, 72.5944764032))
            ThreePointArc((16.2908240974, 72.5944764032), (16.4524687076, 72.5275210134), (16.5194240974, 72.3658764032))
            Line((16.5194240974, 72.3658764032), (16.5194240974, 71.2990764032))
            ThreePointArc((16.5194240974, 71.2990764032), (16.5863794872, 71.137431793), (16.7480240974, 71.0704764032))
            Line((16.7480240974, 71.0704764032), (66.2046312249, 71.0704764032))
            ThreePointArc((66.2046312249, 71.0704764032), (66.3662758351, 71.137431793), (66.4332312249, 71.2990764032))
            Line((66.4332312249, 71.2990764032), (66.4332312249, 72.3658764032))
        make_face()
    extrude(amount=-F10_DEPTH)


solid = f1.part
